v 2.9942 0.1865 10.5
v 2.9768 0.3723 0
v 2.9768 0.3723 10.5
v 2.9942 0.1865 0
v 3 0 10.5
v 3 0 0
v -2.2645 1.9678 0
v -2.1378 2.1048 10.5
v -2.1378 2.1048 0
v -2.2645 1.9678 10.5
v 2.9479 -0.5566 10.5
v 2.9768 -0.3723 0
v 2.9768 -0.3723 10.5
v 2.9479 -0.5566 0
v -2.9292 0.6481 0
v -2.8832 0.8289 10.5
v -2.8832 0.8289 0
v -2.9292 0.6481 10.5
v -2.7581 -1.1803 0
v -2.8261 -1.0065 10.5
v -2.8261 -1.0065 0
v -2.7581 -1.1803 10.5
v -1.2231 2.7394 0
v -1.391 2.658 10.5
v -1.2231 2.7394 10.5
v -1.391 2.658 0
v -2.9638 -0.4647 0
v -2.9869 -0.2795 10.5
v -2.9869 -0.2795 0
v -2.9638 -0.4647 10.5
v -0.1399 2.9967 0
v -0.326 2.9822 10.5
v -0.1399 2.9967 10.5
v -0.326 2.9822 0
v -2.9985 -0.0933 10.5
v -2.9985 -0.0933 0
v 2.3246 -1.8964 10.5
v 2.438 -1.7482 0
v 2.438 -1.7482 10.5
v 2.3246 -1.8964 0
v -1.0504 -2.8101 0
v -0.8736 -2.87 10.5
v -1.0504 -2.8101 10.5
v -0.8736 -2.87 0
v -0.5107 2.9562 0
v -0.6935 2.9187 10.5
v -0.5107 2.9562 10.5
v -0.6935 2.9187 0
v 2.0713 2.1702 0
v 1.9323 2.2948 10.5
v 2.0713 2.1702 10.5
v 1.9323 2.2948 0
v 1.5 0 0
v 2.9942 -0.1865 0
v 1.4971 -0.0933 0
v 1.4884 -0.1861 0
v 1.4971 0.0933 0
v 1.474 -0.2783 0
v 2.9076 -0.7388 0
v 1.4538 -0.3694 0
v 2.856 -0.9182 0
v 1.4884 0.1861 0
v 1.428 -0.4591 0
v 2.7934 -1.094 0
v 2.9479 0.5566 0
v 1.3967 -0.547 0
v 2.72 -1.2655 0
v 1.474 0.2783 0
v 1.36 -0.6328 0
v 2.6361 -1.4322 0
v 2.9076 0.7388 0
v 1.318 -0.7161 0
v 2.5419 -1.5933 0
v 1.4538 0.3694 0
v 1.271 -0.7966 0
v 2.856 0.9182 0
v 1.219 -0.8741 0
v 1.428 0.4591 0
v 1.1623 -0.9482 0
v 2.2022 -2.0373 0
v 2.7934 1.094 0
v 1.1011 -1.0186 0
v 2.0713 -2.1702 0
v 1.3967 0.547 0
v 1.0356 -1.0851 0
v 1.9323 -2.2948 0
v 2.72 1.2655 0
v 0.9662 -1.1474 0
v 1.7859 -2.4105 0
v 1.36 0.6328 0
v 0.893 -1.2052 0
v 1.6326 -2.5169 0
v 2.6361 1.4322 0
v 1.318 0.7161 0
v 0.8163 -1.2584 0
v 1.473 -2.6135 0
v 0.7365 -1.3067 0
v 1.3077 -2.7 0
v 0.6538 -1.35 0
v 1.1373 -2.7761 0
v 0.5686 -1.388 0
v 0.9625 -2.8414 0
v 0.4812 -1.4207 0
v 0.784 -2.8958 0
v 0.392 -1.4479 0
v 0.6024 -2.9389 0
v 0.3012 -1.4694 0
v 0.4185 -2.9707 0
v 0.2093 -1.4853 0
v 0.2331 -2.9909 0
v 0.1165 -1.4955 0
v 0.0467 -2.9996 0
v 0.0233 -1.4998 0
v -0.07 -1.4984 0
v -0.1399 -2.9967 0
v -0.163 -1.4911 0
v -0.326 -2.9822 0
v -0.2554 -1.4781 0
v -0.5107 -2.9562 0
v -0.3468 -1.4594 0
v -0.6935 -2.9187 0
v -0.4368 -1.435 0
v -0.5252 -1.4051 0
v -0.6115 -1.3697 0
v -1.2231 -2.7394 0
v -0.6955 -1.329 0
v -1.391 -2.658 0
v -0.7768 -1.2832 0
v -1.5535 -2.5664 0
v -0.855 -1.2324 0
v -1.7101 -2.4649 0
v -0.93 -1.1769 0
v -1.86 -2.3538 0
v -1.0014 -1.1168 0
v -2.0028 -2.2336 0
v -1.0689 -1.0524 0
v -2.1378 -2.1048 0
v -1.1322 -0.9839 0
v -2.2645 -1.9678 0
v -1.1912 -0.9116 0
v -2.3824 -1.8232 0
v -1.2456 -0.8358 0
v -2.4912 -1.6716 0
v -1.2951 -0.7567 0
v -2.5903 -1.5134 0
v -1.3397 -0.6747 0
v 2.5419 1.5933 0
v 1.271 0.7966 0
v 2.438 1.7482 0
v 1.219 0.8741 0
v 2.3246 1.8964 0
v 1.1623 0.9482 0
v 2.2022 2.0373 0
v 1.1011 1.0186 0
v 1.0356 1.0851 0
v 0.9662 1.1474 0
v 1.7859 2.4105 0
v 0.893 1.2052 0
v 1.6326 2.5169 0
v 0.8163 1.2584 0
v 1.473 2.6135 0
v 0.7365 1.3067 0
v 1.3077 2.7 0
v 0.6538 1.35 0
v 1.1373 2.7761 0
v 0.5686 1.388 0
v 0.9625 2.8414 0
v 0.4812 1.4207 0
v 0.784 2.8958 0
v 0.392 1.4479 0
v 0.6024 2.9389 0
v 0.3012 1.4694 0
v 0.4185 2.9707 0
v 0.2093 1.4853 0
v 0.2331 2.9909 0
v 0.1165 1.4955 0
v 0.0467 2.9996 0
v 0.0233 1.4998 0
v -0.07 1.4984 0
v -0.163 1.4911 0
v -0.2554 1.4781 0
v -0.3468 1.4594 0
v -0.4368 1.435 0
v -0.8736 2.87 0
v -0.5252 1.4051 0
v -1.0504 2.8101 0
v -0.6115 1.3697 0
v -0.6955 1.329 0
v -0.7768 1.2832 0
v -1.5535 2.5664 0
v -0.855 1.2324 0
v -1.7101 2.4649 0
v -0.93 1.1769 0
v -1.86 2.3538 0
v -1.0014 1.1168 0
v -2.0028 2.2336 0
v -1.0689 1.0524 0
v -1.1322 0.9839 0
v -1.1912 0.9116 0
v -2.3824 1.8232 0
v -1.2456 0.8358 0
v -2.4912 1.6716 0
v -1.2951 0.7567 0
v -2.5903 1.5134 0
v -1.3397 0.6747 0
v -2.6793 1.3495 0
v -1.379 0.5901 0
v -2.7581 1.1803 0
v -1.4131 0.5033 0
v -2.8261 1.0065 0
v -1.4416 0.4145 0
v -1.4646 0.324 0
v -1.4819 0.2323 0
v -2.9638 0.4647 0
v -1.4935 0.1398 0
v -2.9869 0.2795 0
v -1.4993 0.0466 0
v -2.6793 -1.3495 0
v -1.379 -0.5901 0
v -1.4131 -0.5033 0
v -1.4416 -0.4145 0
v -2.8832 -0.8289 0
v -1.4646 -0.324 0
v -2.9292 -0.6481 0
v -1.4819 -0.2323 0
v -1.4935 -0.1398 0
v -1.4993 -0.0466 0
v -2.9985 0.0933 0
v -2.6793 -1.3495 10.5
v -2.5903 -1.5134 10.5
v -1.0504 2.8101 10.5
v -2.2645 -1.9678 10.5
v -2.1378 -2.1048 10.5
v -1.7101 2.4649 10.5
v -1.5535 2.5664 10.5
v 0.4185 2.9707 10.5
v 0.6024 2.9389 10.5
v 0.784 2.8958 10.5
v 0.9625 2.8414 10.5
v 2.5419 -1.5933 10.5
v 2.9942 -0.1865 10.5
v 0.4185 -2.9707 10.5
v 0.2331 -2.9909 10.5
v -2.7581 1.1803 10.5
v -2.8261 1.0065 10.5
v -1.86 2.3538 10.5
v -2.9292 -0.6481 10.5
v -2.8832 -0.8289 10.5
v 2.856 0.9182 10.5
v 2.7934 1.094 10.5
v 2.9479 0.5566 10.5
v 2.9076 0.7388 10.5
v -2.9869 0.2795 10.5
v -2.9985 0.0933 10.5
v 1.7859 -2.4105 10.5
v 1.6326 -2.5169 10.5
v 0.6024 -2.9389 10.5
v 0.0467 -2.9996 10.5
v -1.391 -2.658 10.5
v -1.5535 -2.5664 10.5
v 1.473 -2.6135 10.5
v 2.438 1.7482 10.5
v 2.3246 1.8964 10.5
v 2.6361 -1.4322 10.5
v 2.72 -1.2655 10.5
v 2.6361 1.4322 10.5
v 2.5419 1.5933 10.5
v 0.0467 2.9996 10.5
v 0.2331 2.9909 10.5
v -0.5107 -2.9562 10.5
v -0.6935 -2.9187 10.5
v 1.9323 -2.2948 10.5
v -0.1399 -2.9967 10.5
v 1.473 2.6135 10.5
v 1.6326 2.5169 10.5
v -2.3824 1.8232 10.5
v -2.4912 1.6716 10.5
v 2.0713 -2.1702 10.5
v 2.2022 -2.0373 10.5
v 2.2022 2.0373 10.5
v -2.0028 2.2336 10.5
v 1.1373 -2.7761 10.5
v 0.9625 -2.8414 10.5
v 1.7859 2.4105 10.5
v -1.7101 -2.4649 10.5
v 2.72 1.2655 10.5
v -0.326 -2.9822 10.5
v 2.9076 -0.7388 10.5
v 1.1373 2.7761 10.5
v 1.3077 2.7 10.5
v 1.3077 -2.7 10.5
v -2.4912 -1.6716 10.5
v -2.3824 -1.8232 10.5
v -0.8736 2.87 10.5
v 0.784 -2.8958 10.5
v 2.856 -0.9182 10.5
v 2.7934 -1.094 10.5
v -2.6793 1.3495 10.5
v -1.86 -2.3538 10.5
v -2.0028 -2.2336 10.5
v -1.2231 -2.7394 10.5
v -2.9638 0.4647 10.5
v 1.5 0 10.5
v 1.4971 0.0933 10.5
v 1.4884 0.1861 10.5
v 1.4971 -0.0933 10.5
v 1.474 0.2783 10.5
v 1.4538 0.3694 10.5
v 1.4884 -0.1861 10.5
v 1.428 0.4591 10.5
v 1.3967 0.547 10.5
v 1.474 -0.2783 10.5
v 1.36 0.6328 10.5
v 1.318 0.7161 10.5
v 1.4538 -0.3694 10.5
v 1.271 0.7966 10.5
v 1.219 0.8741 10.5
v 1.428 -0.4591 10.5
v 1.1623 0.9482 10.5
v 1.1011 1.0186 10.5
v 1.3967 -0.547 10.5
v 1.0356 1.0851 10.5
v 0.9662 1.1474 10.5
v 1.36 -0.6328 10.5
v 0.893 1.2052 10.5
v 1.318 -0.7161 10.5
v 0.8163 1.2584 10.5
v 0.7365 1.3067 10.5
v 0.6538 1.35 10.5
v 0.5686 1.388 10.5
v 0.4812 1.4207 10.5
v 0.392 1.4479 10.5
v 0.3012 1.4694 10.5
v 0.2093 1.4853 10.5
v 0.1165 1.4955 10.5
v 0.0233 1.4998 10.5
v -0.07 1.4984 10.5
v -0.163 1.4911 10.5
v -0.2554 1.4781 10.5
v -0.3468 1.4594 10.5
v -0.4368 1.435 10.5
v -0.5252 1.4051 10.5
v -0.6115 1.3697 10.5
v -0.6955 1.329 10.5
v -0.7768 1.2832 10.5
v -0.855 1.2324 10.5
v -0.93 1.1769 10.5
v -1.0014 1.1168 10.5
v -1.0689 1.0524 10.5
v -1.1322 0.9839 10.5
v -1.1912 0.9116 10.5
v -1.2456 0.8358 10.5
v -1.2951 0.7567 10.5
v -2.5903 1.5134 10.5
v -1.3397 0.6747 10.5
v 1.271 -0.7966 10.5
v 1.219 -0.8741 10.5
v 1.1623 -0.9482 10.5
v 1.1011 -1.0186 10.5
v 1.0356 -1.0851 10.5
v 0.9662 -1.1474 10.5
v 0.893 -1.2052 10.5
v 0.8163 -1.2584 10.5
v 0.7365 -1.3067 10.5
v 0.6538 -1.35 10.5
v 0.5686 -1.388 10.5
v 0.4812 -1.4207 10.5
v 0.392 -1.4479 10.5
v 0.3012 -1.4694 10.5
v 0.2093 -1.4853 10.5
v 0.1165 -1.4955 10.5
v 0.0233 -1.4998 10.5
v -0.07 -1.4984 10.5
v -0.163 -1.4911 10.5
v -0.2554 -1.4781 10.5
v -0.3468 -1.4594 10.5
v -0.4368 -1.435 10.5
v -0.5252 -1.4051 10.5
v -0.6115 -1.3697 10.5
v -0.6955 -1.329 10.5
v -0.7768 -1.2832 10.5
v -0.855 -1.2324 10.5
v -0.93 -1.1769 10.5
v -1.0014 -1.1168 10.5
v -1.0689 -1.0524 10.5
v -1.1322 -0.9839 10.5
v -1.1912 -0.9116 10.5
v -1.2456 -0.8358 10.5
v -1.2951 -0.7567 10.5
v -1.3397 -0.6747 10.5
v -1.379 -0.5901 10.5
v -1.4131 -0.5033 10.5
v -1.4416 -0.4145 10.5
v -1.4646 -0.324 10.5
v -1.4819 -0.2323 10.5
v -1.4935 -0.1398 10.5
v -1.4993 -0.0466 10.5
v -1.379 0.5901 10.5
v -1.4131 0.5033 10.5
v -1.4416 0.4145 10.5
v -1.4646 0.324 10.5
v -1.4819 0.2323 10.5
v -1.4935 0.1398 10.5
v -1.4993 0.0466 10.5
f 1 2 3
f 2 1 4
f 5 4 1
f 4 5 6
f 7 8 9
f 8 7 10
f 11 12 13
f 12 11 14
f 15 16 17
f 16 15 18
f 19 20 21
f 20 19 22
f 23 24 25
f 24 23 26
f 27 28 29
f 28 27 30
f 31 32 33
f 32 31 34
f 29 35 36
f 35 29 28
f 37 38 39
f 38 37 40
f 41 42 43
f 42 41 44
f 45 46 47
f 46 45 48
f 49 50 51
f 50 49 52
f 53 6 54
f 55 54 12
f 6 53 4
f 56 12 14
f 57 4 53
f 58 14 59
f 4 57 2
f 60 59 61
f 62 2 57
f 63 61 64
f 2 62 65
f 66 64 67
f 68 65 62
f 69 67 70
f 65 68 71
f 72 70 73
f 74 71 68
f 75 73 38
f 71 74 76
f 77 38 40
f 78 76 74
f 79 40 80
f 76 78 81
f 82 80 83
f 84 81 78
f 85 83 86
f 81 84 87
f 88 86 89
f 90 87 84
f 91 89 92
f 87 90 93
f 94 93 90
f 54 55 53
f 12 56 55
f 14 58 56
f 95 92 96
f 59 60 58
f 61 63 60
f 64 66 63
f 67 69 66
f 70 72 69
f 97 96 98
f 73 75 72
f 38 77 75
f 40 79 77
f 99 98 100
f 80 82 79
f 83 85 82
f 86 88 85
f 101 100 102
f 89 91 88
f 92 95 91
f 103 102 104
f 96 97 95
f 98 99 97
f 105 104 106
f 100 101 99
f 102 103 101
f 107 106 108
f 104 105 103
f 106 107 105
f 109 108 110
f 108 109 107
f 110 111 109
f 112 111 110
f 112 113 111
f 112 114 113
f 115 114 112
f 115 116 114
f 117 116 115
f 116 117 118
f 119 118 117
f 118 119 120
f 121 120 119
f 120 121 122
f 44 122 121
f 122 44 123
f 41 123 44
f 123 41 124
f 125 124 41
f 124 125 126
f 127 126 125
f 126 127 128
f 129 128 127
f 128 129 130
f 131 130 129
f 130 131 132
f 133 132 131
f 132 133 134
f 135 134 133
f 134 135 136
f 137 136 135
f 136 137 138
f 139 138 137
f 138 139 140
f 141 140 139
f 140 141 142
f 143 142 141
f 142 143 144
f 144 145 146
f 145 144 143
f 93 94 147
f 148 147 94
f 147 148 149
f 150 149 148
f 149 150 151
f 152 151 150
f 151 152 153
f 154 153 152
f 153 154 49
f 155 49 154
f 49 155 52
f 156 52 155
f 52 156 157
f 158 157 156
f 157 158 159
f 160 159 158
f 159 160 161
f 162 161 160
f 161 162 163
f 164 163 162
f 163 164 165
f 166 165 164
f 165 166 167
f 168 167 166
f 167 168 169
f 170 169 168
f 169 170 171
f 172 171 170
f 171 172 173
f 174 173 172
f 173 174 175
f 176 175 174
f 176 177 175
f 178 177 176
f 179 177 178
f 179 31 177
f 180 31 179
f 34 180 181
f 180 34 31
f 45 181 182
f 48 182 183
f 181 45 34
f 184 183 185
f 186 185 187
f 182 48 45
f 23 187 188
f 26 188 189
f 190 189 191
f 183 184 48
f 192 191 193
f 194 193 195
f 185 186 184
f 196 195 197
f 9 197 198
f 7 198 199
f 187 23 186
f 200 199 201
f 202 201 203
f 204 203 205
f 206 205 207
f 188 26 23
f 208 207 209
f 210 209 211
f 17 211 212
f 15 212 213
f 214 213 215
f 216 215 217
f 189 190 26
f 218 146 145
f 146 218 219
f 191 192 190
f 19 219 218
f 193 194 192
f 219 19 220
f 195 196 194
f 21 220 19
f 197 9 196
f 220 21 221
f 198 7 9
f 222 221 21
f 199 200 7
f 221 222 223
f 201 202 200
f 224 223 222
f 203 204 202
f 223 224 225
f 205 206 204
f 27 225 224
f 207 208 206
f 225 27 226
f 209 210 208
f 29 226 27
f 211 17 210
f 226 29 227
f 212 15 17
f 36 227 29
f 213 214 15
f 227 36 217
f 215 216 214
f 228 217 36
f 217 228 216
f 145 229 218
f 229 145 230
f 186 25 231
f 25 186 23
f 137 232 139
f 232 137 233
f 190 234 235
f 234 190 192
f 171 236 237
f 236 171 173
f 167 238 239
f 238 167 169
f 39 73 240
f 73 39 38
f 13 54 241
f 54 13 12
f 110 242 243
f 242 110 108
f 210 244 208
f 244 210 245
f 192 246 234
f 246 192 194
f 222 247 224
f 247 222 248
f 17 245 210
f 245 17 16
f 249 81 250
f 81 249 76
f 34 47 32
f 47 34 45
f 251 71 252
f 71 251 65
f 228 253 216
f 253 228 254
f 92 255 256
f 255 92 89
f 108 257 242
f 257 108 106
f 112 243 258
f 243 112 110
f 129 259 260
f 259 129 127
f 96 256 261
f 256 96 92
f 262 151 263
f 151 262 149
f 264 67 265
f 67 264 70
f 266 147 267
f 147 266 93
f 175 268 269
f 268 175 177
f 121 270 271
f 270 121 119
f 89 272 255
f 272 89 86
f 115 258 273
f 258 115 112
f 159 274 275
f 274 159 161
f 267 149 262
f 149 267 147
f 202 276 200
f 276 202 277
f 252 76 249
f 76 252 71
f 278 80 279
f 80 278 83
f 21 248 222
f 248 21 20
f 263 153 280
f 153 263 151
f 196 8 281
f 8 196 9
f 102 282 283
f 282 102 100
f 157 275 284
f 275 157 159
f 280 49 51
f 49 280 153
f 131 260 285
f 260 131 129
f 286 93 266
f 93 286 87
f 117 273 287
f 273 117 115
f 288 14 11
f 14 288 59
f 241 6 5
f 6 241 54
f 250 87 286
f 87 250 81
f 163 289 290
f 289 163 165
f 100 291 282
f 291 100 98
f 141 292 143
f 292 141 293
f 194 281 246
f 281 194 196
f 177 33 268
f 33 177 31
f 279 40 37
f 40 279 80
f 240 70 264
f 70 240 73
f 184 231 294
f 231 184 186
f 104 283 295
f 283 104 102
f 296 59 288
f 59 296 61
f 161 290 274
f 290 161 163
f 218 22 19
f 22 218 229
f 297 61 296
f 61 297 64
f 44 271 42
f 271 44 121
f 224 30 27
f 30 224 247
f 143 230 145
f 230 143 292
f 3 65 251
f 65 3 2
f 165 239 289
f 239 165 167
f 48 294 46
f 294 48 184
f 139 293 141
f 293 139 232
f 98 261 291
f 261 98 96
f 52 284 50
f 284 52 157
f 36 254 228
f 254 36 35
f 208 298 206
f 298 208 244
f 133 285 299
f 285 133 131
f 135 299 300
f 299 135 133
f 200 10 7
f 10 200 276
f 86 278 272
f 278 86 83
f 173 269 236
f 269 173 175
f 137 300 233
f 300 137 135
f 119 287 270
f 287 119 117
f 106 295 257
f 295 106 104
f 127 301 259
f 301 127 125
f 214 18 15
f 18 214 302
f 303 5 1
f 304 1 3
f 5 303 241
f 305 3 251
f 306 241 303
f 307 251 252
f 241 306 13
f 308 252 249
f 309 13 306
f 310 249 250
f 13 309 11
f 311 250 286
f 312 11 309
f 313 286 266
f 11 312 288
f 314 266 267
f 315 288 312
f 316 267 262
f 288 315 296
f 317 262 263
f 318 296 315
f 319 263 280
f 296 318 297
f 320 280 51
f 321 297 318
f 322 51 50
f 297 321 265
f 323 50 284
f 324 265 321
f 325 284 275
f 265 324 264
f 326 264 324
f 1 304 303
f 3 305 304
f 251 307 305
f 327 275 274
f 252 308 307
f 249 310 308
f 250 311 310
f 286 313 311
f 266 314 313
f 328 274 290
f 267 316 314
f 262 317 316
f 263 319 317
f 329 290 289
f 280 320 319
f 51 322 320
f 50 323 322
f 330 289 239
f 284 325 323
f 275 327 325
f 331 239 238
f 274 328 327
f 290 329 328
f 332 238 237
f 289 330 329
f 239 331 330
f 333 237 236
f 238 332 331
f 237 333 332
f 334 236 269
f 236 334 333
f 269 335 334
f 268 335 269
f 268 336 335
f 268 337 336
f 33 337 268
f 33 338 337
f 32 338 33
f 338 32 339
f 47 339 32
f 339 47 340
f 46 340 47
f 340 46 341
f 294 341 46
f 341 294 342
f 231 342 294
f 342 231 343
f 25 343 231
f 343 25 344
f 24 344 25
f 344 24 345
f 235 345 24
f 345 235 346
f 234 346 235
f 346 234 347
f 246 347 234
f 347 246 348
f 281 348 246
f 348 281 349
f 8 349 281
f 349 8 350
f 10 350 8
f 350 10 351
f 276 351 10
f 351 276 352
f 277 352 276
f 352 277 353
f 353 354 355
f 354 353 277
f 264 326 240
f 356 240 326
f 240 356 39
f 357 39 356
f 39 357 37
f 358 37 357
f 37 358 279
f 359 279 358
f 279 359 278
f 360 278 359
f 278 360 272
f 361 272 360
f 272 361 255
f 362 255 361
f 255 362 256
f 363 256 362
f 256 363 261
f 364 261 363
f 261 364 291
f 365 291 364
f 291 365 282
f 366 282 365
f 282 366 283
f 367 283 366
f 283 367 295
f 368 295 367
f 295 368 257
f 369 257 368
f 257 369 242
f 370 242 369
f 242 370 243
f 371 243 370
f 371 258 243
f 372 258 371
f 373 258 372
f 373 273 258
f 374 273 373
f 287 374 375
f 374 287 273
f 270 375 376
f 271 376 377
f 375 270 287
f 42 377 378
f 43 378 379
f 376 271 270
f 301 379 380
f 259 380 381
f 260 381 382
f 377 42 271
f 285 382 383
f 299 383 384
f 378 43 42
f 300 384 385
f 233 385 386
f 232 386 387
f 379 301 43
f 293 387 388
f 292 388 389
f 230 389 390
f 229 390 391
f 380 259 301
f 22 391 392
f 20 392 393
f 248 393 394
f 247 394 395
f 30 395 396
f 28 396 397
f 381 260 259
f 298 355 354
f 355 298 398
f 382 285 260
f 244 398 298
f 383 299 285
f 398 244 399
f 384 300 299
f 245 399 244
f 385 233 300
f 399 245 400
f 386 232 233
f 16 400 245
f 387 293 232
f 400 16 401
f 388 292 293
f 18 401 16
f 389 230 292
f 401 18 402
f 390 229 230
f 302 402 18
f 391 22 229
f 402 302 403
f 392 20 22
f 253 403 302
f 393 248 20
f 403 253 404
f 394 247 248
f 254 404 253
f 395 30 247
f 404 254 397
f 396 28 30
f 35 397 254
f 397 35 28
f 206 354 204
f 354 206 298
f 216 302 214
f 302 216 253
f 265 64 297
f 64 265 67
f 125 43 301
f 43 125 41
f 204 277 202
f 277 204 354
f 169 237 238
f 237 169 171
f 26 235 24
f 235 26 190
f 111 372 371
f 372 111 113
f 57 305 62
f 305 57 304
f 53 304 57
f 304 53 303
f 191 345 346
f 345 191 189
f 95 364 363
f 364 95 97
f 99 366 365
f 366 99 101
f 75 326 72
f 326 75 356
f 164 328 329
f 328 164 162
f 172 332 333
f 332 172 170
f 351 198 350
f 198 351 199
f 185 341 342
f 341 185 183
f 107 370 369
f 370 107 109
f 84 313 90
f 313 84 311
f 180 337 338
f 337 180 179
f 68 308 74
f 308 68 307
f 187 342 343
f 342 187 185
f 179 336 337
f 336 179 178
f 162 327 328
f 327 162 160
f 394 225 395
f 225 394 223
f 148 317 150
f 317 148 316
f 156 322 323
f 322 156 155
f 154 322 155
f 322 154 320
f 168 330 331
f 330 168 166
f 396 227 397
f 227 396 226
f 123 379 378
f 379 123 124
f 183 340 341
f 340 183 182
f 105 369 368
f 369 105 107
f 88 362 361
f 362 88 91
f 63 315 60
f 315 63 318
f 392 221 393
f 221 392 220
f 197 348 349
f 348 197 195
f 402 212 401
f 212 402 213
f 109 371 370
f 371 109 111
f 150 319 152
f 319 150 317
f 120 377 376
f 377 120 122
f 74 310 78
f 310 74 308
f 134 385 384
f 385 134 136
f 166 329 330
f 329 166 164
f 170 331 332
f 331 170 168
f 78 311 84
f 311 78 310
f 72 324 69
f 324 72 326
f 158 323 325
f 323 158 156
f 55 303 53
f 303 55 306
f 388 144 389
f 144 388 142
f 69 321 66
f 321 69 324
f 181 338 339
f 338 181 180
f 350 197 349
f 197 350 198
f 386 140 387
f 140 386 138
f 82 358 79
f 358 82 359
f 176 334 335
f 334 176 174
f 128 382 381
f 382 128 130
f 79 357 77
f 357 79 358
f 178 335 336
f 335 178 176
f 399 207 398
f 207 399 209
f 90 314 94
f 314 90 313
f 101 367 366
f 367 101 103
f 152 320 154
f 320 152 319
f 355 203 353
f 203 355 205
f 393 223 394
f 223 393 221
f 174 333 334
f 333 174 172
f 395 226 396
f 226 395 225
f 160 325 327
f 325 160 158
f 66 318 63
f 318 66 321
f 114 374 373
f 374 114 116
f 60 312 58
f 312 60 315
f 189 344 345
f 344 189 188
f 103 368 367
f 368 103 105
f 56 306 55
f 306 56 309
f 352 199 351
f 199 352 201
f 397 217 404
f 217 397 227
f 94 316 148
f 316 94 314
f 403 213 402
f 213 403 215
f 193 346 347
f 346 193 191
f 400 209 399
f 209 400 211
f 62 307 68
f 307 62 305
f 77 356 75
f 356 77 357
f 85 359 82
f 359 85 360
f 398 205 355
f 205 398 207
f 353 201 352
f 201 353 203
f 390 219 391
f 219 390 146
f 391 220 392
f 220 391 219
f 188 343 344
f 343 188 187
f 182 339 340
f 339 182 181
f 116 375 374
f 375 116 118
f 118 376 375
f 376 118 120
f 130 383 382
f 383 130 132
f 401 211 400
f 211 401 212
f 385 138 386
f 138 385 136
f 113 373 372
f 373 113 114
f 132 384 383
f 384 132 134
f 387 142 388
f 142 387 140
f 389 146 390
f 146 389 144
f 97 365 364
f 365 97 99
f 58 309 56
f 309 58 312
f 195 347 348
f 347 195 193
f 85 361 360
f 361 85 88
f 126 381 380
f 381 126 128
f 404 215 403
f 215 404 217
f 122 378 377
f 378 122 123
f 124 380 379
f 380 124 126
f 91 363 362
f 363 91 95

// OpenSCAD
m2_5_clearence = 3.0;
standoff_height = 12.1 - 1.6;
$fn=101;
difference() {
    cylinder(d=6, h=standoff_height);
    cylinder(d=m2_5_clearence, h=100, center=true);
}
